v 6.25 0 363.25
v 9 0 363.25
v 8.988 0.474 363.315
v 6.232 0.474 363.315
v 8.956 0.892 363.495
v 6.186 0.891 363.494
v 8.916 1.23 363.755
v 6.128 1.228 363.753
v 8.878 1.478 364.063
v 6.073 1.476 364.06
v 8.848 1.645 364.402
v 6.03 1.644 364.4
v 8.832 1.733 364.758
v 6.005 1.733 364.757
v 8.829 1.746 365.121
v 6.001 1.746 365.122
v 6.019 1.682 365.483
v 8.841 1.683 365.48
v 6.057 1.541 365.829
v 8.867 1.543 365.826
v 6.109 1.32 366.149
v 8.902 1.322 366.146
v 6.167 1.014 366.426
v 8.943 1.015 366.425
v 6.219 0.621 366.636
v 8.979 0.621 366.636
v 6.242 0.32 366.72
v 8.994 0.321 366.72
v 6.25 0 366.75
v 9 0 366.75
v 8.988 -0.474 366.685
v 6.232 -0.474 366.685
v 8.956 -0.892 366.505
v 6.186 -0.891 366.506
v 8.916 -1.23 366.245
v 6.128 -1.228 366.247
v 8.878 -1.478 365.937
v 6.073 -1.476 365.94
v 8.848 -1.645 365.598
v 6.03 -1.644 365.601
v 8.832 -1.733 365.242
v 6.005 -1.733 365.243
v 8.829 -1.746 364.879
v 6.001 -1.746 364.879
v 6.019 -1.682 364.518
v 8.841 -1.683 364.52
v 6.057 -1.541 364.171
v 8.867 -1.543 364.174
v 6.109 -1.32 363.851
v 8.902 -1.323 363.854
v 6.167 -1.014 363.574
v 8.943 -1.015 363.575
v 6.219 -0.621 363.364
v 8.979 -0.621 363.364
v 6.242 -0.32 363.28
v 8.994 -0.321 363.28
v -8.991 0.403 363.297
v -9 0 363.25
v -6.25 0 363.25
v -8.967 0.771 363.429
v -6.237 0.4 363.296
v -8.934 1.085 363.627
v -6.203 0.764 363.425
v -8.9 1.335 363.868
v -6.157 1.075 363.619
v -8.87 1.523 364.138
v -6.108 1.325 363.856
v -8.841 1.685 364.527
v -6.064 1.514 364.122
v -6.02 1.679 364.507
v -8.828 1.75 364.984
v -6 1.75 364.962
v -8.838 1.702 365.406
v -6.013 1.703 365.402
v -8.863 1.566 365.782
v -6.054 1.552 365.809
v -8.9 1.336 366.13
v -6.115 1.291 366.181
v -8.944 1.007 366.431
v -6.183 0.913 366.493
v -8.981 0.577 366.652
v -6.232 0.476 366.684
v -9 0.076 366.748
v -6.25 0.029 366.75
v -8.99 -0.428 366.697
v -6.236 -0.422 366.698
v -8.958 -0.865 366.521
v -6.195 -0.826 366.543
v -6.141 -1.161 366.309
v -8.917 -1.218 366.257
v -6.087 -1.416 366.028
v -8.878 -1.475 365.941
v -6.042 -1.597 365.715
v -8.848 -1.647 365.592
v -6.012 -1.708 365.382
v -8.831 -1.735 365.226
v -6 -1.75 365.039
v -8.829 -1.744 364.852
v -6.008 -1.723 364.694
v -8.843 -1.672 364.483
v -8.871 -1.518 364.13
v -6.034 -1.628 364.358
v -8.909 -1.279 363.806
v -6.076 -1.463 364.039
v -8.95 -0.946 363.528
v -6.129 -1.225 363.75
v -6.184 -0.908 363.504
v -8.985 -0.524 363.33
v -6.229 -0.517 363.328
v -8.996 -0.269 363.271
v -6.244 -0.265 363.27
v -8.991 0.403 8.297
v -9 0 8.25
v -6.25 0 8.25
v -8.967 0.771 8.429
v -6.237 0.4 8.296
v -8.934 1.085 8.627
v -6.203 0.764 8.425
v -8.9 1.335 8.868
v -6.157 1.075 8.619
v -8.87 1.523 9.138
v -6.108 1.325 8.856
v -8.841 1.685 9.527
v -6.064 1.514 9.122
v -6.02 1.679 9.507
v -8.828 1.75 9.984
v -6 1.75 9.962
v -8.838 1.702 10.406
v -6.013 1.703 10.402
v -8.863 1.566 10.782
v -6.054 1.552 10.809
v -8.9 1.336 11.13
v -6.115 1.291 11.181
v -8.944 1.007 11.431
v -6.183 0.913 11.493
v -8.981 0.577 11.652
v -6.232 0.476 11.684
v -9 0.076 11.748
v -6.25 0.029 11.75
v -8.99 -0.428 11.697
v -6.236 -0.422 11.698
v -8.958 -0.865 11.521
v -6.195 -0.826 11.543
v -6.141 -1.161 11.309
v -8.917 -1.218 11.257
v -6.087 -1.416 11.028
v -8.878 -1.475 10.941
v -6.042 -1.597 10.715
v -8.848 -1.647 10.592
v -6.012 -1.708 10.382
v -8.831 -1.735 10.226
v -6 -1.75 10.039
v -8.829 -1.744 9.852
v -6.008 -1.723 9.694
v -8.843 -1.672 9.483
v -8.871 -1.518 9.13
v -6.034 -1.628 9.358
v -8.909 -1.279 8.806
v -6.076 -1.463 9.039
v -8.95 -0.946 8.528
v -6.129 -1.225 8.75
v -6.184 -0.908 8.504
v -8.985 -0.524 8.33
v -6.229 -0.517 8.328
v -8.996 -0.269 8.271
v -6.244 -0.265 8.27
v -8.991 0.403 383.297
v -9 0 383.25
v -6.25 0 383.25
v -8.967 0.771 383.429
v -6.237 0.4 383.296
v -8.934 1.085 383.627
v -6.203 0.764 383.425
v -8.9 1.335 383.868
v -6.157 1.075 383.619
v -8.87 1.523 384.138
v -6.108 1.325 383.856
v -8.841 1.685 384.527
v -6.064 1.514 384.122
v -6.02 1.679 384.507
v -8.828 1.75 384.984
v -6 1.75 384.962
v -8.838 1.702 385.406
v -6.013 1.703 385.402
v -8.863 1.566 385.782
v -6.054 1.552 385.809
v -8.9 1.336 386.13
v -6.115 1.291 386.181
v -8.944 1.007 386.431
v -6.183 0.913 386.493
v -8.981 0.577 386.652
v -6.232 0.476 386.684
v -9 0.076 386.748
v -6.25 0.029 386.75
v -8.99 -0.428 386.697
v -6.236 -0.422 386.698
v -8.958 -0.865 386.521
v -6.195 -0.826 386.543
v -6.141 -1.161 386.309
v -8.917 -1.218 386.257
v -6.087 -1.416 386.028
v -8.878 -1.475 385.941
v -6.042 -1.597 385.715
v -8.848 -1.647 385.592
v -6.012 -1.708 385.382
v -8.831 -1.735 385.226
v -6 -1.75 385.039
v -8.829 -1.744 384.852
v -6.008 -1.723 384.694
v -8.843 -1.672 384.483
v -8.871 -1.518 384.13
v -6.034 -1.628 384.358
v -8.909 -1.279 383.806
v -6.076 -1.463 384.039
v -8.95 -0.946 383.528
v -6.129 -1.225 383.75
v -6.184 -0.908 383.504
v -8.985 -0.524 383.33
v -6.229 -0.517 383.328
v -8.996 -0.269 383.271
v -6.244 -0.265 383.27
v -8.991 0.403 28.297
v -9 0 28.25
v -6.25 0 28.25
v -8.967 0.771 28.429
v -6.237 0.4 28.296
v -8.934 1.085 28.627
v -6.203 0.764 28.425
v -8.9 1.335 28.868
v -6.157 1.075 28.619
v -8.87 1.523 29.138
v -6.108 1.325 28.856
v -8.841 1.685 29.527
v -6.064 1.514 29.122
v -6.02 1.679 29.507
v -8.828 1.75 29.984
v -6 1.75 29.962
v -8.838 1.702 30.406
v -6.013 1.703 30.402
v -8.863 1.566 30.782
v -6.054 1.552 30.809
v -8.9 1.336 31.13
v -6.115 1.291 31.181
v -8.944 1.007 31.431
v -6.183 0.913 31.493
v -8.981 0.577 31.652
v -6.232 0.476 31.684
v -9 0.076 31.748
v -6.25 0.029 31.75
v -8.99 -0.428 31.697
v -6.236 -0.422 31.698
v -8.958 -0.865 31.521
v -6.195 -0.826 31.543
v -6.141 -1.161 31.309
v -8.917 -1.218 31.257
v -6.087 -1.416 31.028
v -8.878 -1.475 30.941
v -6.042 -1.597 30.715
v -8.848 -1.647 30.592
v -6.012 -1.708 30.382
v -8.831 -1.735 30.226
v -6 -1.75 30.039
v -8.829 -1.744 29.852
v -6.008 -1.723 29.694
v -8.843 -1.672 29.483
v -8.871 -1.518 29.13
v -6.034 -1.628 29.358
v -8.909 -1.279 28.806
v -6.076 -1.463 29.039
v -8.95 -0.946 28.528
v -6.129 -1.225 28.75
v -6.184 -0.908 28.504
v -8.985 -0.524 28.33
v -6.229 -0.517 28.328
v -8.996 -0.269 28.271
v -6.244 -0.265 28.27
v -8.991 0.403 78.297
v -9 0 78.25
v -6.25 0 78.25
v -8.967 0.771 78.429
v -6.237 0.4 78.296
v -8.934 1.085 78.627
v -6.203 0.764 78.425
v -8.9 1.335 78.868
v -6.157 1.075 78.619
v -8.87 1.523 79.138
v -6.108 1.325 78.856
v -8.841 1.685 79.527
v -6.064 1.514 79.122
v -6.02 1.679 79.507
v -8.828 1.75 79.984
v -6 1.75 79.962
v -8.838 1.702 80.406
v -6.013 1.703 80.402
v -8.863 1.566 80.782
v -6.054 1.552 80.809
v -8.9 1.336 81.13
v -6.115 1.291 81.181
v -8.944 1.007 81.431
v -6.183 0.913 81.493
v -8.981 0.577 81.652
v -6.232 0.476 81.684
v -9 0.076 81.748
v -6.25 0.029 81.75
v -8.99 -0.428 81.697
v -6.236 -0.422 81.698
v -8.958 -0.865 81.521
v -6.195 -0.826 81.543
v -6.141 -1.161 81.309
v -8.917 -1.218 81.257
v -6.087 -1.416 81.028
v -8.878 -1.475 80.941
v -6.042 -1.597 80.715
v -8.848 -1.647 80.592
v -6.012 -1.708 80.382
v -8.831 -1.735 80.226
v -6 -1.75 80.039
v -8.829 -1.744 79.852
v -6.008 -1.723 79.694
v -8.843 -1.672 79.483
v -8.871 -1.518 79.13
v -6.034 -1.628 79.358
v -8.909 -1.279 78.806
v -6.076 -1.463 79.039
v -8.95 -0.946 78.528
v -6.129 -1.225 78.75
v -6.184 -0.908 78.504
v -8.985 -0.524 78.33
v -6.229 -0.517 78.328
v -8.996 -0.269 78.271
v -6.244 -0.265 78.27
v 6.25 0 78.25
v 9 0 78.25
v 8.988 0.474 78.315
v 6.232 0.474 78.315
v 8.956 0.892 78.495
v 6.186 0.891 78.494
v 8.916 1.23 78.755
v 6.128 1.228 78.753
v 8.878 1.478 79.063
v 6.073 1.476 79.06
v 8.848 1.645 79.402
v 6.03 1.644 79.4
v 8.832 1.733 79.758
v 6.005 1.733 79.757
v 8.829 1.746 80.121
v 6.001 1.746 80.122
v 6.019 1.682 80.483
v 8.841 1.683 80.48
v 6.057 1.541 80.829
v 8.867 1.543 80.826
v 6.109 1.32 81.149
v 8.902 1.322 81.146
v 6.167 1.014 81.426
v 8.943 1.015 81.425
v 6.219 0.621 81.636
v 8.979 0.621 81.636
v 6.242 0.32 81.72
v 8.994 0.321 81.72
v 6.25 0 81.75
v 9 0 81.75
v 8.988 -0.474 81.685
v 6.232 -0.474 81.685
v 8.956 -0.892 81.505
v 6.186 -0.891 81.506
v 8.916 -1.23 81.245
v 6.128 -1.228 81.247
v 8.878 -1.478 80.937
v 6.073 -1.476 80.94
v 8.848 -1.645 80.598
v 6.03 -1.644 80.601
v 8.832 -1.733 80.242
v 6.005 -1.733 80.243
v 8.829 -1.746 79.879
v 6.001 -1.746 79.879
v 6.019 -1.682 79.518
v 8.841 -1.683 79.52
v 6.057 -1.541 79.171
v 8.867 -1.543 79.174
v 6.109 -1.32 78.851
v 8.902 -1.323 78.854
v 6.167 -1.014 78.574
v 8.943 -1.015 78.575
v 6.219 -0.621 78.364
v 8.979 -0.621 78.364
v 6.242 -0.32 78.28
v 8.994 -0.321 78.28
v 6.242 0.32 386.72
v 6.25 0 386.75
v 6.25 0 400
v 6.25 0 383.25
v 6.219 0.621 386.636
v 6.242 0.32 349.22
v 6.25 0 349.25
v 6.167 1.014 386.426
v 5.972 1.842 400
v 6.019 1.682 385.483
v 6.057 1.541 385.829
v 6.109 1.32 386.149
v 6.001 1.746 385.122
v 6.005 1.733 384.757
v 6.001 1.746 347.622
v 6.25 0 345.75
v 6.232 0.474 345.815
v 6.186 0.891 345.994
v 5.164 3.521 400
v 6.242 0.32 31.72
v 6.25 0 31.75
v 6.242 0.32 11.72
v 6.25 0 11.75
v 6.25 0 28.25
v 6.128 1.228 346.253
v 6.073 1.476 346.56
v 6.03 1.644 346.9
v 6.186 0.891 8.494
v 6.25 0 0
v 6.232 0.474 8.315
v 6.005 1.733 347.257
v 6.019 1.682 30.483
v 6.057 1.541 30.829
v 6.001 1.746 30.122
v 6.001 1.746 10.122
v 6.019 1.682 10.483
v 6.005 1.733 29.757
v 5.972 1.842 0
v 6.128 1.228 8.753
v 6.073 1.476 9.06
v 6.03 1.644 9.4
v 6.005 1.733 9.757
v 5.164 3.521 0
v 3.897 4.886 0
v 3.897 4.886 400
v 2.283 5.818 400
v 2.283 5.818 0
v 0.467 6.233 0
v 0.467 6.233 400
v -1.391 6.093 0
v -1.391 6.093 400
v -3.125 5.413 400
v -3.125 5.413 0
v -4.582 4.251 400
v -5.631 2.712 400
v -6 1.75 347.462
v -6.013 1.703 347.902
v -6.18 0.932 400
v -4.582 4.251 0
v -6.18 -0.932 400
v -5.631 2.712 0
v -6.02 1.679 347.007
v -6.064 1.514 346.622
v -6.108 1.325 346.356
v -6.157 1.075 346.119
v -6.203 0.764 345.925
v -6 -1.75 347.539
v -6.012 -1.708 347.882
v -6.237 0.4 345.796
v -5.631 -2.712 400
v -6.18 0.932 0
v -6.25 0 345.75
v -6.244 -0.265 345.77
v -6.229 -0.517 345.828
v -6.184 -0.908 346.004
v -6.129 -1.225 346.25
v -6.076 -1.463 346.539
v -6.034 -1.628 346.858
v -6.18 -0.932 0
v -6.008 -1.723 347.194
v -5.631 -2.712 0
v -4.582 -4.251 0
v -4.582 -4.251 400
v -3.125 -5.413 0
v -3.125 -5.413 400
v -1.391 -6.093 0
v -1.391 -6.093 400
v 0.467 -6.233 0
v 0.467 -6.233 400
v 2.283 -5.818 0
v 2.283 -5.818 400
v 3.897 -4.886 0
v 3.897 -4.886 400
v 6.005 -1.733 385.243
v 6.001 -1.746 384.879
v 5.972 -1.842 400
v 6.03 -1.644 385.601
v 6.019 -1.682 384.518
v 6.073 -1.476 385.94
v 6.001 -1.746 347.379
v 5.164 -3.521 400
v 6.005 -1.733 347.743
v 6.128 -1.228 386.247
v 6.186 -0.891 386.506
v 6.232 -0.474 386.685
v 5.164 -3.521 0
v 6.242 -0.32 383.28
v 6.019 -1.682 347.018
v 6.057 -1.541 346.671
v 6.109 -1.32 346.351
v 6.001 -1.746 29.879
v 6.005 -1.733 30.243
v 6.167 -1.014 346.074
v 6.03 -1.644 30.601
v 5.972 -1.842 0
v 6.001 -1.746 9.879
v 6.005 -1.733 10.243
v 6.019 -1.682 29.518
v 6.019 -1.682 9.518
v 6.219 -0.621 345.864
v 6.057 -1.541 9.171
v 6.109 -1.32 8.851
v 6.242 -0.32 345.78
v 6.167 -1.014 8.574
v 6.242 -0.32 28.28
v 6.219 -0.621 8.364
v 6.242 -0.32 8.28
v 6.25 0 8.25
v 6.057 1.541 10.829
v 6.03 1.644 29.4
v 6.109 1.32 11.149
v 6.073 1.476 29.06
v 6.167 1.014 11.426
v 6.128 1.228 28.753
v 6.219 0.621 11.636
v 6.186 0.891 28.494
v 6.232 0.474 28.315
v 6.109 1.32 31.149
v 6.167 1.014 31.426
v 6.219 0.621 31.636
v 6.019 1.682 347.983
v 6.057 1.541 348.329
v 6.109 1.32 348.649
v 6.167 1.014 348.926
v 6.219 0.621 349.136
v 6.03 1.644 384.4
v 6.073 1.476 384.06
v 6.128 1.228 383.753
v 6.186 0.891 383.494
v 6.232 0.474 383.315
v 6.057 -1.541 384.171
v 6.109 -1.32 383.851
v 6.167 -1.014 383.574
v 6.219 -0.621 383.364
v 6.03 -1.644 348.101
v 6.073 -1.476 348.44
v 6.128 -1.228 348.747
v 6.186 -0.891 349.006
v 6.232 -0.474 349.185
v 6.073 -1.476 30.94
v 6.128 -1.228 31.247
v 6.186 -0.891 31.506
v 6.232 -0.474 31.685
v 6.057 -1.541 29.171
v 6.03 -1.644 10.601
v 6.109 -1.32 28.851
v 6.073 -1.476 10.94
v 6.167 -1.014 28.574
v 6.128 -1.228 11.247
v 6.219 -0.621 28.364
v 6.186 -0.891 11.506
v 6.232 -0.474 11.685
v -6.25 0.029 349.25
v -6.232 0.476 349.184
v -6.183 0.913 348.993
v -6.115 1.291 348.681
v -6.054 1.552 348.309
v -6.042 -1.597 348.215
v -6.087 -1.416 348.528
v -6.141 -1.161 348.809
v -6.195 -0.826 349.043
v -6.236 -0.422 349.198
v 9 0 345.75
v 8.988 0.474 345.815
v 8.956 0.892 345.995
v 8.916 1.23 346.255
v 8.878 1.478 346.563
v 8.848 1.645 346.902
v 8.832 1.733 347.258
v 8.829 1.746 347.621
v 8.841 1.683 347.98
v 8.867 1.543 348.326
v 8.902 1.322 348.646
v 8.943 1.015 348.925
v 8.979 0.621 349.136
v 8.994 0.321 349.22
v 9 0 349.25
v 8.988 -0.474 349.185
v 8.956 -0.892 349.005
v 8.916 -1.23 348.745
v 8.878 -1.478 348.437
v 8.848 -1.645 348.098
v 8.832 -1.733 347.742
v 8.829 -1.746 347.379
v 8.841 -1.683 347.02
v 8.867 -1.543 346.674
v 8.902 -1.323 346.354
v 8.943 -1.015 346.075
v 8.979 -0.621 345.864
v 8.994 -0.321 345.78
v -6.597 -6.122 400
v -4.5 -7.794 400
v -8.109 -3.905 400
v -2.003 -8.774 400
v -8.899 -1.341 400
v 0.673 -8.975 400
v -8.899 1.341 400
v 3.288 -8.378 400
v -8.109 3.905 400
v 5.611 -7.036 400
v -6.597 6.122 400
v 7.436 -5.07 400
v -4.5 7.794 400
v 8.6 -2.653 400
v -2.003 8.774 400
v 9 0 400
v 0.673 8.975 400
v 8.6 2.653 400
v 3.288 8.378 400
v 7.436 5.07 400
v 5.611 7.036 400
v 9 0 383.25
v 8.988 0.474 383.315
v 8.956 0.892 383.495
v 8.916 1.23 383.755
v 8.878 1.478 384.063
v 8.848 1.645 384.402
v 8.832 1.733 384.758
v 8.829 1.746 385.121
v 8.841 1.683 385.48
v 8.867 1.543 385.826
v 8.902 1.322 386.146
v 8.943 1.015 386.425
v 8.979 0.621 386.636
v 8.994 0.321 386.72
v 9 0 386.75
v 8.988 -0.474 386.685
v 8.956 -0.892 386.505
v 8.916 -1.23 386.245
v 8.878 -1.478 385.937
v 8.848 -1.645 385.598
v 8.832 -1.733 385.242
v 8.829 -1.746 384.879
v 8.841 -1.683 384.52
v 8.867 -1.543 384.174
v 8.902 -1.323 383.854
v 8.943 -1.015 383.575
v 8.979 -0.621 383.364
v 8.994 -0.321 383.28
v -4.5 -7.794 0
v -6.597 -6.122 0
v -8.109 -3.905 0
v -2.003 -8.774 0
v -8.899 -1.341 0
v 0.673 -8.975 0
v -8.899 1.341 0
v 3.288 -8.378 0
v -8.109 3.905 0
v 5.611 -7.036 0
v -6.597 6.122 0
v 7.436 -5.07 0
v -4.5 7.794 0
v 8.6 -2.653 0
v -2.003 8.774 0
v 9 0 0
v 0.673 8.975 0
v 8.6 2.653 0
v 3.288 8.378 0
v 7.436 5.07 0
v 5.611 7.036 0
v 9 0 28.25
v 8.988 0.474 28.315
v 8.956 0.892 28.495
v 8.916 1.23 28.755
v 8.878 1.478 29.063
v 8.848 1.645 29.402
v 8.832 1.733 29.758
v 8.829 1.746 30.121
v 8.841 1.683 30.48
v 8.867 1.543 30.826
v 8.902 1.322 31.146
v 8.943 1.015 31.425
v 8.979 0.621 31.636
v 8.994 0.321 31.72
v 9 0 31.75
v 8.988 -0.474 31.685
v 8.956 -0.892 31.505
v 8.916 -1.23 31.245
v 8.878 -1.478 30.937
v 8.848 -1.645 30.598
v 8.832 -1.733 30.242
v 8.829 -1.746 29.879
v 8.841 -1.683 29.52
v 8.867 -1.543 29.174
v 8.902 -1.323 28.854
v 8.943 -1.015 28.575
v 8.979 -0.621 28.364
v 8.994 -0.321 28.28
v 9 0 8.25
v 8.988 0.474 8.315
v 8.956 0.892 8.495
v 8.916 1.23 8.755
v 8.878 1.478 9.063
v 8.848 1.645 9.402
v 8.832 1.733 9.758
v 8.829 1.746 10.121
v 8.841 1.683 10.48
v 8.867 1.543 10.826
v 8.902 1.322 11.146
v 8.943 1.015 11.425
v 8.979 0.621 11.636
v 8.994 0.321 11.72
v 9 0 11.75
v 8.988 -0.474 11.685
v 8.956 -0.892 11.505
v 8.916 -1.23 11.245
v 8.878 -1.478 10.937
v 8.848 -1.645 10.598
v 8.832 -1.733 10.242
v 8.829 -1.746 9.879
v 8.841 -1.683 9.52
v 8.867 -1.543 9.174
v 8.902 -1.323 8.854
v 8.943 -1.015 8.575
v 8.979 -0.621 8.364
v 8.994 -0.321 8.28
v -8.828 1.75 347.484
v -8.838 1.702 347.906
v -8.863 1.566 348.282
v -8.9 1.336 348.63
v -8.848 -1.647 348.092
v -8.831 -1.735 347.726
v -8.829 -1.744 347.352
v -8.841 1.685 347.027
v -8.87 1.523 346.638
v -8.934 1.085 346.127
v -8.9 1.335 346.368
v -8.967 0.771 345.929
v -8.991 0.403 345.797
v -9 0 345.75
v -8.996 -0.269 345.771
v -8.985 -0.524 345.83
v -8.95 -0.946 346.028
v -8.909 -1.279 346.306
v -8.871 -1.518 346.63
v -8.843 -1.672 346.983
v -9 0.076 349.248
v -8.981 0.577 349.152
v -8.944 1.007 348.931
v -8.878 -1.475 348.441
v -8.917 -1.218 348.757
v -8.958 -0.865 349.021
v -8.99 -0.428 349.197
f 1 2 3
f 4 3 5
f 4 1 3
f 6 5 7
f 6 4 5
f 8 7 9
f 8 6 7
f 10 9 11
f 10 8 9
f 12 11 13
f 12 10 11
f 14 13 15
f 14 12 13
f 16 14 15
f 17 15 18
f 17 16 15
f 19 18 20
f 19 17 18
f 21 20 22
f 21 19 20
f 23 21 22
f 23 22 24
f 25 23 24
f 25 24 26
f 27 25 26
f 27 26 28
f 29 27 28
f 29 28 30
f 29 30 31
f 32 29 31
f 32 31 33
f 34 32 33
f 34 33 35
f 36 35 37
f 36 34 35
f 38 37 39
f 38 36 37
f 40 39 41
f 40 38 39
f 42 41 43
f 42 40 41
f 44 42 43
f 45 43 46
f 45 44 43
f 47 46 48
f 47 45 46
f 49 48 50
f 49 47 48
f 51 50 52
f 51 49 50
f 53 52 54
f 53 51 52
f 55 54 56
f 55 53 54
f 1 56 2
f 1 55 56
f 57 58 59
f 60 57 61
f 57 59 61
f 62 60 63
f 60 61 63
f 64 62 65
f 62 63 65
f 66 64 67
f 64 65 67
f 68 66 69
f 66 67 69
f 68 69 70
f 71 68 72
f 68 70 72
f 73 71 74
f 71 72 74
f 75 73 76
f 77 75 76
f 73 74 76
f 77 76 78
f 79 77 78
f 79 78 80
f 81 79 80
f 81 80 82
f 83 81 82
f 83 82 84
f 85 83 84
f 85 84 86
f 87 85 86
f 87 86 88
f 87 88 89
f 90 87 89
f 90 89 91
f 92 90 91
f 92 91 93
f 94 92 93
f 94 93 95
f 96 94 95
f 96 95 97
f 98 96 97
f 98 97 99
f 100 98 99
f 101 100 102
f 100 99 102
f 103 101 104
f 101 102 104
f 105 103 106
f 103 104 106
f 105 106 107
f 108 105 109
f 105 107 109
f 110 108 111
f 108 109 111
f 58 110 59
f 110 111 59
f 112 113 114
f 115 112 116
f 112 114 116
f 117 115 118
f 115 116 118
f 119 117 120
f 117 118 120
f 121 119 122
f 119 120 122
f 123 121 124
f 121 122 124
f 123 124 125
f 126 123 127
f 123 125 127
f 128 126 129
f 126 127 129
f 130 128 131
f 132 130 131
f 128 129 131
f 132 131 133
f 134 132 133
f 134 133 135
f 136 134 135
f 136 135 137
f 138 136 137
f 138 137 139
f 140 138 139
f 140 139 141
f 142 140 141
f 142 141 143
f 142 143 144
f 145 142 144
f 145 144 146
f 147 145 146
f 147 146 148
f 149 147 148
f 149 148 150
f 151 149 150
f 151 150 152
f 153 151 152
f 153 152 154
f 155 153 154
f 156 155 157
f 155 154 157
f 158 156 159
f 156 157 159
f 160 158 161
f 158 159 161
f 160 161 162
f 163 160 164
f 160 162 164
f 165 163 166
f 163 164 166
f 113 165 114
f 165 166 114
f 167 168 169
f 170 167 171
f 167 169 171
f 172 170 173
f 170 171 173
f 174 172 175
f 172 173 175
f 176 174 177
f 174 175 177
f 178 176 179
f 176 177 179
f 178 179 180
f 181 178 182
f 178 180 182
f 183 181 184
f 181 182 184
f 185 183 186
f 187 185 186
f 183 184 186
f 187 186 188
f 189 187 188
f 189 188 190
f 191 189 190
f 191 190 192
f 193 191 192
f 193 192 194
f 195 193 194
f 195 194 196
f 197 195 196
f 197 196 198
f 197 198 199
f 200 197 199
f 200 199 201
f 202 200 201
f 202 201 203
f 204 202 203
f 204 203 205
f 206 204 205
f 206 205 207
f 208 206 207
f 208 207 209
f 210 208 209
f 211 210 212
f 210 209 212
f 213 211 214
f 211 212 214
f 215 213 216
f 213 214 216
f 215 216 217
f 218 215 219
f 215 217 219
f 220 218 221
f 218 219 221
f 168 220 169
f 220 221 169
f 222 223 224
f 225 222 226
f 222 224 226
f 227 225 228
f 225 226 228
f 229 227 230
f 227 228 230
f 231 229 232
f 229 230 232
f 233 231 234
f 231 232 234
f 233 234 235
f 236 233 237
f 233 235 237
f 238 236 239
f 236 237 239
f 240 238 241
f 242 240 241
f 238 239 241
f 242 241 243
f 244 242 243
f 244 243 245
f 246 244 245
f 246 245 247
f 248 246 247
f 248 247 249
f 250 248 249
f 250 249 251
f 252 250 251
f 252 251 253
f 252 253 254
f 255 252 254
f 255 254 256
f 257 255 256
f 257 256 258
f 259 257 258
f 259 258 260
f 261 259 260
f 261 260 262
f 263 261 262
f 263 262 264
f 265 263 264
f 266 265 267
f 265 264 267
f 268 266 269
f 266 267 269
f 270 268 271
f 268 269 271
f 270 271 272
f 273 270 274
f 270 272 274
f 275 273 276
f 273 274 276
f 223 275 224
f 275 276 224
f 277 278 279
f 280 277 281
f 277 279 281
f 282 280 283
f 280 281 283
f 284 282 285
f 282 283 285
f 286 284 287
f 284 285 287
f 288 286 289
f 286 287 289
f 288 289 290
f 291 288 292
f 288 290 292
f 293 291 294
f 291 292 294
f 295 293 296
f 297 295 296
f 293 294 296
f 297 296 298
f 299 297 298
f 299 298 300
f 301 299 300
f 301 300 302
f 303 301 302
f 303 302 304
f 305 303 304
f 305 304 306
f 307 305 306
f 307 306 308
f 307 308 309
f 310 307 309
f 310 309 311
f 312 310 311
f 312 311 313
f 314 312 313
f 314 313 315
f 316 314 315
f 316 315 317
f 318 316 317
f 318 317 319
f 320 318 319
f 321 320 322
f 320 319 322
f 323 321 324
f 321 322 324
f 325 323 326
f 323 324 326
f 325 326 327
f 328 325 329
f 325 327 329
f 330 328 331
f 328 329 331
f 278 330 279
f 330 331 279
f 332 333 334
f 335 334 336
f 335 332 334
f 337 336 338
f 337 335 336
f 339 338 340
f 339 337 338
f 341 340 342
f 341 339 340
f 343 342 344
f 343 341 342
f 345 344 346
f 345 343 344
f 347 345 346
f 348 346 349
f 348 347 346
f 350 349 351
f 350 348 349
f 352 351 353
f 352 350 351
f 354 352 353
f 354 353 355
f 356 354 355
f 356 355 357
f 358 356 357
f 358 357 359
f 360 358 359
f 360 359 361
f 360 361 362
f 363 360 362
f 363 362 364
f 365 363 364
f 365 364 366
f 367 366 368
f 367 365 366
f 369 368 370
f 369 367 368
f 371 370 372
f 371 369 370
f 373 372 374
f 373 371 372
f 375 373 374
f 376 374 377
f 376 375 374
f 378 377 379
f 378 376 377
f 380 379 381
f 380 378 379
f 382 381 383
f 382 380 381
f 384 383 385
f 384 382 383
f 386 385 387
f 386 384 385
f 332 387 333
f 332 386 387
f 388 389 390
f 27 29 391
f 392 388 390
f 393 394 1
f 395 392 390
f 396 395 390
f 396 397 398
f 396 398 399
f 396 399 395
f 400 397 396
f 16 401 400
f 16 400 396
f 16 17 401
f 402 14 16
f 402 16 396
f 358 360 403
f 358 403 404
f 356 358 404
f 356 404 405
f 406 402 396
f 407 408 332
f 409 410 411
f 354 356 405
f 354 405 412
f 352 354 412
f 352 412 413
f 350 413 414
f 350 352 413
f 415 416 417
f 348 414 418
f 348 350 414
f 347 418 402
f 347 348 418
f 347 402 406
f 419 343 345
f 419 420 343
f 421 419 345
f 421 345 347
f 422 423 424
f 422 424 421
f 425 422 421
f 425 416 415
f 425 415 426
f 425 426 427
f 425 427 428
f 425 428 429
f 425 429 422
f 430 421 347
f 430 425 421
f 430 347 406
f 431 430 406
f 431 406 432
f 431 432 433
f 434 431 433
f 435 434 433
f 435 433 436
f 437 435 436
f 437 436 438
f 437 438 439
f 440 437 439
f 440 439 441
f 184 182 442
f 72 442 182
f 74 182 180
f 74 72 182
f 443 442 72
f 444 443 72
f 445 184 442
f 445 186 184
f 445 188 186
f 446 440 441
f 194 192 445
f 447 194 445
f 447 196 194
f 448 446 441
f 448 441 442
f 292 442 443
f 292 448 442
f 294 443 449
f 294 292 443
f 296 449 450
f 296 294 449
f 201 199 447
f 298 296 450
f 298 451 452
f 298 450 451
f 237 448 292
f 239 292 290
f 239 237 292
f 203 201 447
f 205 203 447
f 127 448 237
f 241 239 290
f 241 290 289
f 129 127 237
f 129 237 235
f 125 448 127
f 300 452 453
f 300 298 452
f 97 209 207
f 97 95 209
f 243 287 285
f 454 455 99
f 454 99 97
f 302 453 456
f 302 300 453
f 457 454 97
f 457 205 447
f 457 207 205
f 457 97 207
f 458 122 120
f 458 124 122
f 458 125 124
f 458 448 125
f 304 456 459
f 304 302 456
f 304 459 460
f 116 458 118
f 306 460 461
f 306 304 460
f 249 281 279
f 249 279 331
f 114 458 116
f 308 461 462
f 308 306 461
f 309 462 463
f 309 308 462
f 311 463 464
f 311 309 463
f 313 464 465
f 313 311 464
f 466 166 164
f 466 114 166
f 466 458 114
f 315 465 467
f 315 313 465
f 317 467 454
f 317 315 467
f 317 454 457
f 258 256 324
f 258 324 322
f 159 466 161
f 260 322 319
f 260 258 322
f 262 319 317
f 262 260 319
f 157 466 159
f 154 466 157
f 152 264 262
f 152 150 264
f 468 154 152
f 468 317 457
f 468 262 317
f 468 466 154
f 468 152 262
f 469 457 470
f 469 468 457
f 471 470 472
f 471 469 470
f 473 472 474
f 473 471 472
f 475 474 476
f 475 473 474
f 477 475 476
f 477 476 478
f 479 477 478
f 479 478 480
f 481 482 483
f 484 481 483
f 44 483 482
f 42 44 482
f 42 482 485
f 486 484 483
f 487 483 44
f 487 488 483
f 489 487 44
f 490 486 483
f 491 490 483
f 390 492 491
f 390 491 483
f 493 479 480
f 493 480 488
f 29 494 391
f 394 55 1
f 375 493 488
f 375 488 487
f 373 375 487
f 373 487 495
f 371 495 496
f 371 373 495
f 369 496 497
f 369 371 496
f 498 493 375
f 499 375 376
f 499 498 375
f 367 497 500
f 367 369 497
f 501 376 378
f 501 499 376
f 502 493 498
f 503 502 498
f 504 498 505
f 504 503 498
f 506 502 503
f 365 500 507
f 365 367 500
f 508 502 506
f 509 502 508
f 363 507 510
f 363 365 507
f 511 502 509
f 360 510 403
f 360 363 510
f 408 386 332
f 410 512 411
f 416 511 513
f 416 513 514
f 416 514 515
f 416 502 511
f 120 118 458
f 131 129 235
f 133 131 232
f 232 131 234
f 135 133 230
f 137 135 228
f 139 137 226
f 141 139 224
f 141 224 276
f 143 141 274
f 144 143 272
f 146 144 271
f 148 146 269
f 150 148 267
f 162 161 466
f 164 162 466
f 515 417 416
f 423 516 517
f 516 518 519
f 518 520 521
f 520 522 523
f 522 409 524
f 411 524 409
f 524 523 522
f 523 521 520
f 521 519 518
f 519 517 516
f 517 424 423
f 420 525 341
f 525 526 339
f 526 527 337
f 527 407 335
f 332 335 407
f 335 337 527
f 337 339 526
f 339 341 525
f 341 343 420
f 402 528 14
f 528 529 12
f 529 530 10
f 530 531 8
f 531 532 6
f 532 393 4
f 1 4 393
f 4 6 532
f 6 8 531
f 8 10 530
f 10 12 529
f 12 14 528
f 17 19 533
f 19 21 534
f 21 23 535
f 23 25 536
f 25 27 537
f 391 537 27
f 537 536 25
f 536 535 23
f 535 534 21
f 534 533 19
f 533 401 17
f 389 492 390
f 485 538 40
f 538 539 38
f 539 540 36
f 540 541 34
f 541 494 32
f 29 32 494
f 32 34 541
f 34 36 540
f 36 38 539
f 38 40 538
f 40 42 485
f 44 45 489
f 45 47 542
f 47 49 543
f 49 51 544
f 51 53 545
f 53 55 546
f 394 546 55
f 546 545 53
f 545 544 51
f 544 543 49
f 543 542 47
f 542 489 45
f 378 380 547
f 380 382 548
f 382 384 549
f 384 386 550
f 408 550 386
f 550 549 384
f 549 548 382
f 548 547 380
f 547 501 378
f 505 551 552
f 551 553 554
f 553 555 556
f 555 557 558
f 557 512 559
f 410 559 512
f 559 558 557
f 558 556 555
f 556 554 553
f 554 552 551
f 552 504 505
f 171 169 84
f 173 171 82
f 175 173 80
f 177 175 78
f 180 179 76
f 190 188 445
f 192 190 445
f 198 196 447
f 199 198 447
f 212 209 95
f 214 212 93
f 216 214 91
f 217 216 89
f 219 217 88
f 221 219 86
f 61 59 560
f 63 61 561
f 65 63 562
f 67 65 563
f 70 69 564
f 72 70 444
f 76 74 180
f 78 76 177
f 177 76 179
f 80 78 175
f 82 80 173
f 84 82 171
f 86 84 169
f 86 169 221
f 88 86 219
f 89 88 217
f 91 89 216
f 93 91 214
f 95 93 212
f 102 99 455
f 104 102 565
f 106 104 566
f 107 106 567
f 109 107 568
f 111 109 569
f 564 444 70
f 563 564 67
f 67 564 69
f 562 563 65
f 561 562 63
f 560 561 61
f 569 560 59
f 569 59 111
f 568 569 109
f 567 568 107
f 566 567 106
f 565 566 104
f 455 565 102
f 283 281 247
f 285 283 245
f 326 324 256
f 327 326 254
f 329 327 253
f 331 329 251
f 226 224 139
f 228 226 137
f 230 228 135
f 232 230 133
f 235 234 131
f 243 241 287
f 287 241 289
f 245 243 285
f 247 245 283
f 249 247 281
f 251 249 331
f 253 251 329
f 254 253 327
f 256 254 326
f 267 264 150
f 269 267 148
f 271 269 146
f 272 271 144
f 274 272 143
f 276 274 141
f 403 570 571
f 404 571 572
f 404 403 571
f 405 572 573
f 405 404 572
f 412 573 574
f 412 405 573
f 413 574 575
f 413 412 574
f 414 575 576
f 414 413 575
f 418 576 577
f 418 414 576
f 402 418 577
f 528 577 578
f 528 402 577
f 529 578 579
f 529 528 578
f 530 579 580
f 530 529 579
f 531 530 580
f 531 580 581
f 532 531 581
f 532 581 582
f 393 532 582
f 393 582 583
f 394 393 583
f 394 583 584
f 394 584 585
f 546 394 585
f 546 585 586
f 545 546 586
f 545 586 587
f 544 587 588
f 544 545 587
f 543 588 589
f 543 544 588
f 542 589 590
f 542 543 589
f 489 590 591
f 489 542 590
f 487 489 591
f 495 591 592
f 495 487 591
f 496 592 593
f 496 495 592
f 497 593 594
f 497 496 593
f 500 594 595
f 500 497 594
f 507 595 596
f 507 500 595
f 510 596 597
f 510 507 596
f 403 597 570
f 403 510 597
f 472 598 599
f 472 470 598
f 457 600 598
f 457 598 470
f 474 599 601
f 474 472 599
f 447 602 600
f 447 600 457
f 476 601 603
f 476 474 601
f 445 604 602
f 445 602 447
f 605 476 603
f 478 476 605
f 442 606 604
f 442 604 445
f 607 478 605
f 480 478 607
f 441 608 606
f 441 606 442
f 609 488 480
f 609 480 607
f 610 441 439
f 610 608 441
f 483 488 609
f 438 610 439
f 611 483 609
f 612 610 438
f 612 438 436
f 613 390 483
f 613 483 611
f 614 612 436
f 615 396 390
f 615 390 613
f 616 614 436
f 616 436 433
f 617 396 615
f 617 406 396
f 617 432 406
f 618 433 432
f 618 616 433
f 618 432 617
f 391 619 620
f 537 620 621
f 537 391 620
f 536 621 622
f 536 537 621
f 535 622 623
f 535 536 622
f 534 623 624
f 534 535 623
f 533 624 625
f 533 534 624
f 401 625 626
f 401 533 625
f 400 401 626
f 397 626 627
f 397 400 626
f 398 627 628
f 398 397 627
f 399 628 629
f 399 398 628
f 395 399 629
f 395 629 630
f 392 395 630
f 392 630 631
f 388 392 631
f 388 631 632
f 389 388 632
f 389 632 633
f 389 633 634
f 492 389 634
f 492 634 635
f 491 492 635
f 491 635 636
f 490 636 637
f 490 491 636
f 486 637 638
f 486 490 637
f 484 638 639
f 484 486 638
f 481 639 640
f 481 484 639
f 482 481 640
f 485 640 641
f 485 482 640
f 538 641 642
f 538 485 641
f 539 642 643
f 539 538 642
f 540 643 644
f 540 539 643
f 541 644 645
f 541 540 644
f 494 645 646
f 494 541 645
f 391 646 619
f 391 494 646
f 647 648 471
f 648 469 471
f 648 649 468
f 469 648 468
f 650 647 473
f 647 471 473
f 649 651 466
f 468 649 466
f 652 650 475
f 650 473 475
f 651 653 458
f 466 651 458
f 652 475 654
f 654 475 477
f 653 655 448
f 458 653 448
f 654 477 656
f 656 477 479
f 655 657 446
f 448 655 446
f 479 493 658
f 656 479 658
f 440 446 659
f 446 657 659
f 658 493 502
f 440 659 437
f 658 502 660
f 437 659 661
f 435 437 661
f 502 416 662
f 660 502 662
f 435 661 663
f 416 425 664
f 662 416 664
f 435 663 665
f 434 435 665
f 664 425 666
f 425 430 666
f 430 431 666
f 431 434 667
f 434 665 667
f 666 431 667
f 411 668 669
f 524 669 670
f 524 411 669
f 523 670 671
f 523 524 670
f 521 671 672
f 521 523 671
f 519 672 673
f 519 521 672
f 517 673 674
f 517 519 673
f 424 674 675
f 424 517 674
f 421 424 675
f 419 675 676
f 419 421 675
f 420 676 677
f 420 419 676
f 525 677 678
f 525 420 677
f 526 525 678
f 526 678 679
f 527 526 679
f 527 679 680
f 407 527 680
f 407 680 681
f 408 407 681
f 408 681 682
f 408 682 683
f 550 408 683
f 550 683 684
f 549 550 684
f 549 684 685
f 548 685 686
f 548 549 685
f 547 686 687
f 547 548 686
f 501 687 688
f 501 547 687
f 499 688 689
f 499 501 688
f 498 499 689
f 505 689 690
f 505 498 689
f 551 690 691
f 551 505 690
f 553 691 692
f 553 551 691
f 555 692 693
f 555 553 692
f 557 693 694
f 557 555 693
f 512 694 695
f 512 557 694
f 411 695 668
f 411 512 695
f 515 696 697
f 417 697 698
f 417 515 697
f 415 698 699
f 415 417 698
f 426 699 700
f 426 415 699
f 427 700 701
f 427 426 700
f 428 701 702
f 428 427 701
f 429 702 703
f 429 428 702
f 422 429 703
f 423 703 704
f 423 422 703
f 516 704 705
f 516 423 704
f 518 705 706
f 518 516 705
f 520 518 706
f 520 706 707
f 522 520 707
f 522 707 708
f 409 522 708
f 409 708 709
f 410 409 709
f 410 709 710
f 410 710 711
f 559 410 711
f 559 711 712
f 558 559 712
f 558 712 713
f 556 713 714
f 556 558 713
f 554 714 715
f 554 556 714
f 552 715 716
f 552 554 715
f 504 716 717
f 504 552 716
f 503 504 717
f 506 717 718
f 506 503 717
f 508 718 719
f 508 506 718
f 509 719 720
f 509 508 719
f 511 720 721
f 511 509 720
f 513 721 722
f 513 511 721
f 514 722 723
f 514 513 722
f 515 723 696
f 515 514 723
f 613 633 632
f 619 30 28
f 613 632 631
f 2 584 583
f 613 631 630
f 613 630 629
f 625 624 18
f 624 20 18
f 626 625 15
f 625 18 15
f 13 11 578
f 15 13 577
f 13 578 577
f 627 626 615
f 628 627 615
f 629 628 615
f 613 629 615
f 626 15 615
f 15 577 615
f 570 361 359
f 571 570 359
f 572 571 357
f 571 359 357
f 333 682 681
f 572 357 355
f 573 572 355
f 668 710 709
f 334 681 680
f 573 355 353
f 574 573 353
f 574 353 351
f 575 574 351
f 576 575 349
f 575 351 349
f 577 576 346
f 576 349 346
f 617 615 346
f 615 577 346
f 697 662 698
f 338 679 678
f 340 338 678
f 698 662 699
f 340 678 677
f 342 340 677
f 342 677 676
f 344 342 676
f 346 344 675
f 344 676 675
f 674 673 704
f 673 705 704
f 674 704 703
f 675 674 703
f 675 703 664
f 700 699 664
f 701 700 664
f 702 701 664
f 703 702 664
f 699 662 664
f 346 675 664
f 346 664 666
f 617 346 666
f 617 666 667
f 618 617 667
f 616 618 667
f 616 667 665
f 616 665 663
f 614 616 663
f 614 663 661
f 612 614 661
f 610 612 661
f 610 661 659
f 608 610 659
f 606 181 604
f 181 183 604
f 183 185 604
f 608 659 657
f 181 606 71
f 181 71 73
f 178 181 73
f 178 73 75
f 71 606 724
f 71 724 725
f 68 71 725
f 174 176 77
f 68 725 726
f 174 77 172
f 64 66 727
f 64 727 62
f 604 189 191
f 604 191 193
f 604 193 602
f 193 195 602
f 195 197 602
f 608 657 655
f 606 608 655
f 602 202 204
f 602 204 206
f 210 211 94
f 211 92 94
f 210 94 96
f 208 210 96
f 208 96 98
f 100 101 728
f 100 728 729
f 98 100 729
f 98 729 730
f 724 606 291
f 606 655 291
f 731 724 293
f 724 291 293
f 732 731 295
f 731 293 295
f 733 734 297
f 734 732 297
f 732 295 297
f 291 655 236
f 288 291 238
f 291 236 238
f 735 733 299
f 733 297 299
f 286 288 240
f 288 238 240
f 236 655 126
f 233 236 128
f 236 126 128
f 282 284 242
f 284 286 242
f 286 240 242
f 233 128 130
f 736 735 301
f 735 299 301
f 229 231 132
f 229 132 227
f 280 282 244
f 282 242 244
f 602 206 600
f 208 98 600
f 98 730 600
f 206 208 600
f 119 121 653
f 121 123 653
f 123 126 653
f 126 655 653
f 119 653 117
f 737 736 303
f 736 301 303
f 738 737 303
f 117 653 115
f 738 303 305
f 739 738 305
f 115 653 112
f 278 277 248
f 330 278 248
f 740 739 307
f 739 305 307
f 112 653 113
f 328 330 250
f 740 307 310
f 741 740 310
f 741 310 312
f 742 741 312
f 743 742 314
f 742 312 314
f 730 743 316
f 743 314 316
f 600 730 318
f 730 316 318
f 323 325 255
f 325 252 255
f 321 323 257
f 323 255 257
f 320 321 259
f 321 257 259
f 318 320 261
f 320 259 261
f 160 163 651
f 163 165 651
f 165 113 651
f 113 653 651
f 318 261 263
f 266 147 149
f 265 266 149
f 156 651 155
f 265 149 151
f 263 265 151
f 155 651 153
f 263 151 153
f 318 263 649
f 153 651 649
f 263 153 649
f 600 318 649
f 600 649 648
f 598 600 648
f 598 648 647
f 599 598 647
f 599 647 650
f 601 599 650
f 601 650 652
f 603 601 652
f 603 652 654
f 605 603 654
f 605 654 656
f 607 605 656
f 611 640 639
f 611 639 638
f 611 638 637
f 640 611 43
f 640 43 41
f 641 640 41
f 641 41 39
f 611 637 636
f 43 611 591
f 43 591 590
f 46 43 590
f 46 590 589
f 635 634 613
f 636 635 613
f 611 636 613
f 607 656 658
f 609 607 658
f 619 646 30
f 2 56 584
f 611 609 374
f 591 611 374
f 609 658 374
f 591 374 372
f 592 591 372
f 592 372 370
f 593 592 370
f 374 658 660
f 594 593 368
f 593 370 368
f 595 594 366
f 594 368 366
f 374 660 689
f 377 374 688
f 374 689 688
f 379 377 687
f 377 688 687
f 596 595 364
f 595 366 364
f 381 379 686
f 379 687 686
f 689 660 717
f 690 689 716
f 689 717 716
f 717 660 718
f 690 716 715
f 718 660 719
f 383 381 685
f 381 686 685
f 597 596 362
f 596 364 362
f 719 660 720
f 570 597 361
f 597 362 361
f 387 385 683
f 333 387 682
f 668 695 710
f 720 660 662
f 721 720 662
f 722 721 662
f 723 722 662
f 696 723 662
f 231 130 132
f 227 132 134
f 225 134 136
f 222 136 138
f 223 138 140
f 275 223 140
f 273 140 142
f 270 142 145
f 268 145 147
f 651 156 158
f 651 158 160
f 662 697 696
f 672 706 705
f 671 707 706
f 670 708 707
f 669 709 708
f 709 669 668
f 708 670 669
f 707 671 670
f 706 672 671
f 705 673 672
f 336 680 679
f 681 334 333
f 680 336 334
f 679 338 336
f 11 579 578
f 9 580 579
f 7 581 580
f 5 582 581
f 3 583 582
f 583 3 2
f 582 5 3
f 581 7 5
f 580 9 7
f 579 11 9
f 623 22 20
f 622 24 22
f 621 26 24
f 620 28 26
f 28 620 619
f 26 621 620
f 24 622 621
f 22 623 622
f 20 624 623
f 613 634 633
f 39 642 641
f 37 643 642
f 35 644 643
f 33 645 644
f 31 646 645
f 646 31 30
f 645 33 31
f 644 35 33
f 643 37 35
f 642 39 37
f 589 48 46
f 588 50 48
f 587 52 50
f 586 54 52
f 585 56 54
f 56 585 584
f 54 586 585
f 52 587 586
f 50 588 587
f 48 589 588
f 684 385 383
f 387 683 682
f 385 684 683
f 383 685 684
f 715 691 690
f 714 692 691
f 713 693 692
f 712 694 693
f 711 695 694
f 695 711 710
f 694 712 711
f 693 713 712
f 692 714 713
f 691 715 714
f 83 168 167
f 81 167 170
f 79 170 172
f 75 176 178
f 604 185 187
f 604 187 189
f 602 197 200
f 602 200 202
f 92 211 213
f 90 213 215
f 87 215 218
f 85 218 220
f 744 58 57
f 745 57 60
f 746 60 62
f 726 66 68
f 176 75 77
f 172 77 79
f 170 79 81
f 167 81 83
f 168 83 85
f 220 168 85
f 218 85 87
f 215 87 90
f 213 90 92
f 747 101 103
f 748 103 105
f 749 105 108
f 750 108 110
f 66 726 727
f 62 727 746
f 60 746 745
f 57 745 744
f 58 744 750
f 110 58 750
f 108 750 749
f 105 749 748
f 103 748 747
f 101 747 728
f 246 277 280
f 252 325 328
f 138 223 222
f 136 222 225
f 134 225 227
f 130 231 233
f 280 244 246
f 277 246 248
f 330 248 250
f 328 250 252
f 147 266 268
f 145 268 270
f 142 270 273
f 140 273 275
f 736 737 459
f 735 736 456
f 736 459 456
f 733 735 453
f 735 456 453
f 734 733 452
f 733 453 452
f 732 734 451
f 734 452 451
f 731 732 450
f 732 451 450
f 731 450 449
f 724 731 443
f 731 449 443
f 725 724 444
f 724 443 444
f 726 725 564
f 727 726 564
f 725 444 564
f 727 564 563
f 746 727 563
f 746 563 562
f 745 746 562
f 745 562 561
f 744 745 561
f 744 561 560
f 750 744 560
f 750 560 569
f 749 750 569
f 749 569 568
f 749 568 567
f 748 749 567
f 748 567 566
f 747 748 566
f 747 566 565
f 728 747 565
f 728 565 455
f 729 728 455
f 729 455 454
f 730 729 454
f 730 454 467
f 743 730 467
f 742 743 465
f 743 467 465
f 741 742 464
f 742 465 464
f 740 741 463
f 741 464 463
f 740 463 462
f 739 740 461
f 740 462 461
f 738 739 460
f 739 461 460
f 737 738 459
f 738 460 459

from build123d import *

# Parameters (mm, degrees)
SKETCH_1_R               = 9
SKETCH_1_R_2             = 6.25
EXTRUDE_1_DEPTH          = 400
SKETCH_2_R               = 1.75
CUT_EXTRUDE_1_DEPTH      = 10
CUT_EXTRUDE_1_DEPTH_BACK = 10


with BuildPart() as part:
    # ｽｹｯﾁ1 → ﾎﾞｽ - 押し出し1 (new body)
    with BuildSketch(Plane.XY):
        Circle(SKETCH_1_R)
        Circle(SKETCH_1_R_2, mode=Mode.SUBTRACT)
    extrude(amount=EXTRUDE_1_DEPTH)

    # ｽｹｯﾁ2 → ｶｯﾄ - 押し出し1 (cut, two sides)
    with BuildSketch(Plane(origin=(0, 0, 0), x_dir=(0, 0, -1), z_dir=(1, 0, 0))) as cut_extrude_1_sk:
        with Locations((-10, 0)):
            Circle(SKETCH_2_R)
        with Locations((-385, 0)):
            Circle(SKETCH_2_R)
        with Locations((-30, 0)):
            Circle(SKETCH_2_R)
        with Locations((-365, 0)):
            Circle(SKETCH_2_R)
        with Locations((-347.5, 0)):
            Circle(SKETCH_2_R)
        with Locations((-80, 0)):
            Circle(SKETCH_2_R)
    extrude(amount=CUT_EXTRUDE_1_DEPTH, mode=Mode.SUBTRACT)
    extrude(cut_extrude_1_sk.sketch, amount=-CUT_EXTRUDE_1_DEPTH_BACK, mode=Mode.SUBTRACT)


solid = part.part
